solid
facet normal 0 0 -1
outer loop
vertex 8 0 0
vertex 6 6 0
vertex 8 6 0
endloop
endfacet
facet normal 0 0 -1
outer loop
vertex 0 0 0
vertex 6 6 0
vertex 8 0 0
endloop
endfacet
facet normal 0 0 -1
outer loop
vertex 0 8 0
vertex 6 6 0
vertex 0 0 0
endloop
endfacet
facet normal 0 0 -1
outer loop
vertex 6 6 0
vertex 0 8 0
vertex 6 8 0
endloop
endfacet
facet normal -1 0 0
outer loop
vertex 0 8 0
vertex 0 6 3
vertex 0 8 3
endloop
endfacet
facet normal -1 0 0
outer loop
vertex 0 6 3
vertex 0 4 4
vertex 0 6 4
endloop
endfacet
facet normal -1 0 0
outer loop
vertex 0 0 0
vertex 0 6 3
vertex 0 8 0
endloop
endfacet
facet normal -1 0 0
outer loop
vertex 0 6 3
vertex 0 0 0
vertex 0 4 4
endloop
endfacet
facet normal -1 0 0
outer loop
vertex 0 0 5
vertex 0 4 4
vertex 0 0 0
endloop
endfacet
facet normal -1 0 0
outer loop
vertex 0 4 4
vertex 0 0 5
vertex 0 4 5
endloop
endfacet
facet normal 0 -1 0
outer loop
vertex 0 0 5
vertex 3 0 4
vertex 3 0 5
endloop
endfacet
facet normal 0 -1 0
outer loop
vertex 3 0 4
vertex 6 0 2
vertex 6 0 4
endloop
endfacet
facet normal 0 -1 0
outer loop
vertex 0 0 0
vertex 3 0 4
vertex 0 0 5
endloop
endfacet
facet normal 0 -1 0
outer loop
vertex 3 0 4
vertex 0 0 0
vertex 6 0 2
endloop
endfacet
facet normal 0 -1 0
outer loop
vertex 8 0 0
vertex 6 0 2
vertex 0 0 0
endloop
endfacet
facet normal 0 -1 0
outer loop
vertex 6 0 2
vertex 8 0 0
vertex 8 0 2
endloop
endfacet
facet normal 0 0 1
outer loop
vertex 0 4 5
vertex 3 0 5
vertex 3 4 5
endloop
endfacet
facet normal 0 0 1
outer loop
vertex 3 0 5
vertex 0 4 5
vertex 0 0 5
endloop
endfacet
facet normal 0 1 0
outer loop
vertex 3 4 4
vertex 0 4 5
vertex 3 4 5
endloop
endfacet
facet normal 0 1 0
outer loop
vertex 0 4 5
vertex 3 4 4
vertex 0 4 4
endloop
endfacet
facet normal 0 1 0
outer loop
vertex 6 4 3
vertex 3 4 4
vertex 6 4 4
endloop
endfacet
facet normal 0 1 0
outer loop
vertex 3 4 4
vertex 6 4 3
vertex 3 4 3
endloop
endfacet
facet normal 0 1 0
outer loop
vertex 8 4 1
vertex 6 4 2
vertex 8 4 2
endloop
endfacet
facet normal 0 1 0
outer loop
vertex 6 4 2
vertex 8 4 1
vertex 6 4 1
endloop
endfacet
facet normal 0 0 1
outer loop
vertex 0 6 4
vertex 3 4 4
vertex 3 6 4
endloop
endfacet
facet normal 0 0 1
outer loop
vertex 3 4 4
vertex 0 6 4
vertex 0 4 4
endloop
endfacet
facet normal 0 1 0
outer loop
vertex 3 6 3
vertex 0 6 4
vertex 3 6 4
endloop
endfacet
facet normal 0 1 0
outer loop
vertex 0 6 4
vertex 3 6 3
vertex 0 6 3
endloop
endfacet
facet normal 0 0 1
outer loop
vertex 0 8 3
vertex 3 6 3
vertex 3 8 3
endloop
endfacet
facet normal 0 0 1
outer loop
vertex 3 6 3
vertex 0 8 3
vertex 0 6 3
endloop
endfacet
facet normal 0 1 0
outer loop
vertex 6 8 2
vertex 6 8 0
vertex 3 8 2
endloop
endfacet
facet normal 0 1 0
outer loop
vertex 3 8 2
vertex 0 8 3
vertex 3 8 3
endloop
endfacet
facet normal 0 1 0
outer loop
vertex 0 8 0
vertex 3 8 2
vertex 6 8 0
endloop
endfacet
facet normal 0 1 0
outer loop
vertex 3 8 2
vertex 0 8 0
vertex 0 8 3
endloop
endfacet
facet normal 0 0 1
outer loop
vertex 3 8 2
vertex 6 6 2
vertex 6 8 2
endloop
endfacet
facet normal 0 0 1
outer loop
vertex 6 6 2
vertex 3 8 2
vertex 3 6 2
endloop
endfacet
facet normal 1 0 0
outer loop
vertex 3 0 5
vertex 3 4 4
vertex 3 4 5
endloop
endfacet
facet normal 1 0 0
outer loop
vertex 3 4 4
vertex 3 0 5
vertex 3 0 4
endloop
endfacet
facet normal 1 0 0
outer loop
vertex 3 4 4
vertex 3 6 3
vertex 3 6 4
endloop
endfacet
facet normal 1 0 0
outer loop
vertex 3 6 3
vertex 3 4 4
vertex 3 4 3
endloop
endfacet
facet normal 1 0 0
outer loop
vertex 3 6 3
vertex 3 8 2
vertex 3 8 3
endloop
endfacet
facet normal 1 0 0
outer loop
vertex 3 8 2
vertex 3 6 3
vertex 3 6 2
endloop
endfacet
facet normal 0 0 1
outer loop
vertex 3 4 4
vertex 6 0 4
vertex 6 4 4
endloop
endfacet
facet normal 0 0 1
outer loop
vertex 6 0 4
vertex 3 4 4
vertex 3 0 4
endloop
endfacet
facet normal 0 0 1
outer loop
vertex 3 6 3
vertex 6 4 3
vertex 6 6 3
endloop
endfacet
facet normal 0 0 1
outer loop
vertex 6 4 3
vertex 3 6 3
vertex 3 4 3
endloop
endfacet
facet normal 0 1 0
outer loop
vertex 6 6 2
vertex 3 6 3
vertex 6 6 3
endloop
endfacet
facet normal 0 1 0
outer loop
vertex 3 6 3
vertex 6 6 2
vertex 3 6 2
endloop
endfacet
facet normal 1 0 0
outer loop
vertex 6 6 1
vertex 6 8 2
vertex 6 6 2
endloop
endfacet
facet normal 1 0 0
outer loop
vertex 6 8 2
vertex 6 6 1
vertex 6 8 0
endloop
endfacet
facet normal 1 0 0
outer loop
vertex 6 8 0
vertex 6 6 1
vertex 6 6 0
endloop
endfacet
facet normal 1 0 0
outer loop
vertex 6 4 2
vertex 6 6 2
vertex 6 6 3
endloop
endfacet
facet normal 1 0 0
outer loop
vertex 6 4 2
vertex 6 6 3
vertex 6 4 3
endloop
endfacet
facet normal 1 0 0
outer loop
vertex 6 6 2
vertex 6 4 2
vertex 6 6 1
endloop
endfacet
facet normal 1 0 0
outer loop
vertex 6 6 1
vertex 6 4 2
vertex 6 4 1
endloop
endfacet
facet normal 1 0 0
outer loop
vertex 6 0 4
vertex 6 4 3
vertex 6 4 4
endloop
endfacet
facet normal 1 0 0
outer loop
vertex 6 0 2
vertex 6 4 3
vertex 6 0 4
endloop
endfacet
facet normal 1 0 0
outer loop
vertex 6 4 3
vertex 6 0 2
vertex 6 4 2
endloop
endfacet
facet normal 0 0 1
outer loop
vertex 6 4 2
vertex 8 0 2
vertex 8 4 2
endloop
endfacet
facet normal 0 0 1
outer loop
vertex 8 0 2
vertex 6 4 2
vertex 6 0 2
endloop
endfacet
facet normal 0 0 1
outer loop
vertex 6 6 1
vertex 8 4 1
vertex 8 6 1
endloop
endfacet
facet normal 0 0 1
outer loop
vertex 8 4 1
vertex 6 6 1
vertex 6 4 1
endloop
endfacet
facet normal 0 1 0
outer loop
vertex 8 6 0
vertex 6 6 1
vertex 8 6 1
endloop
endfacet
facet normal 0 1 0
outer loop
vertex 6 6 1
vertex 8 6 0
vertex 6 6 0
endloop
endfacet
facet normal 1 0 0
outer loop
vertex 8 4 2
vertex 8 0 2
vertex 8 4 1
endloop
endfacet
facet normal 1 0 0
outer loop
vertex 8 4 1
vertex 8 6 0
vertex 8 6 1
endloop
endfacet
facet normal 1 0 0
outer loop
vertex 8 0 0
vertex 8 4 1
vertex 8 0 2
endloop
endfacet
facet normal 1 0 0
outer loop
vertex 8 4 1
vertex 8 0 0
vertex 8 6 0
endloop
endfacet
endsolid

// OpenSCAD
union() {
    translate([0, 0, 0]) cube([1, 1, 1]);
    translate([0, 0, 1]) cube([1, 1, 1]);
    translate([0, 0, 2]) cube([1, 1, 1]);
    translate([0, 0, 3]) cube([1, 1, 1]);
    translate([0, 0, 4]) cube([1, 1, 1]);
    translate([0, 1, 0]) cube([1, 1, 1]);
    translate([0, 1, 1]) cube([1, 1, 1]);
    translate([0, 1, 2]) cube([1, 1, 1]);
    translate([0, 1, 3]) cube([1, 1, 1]);
    translate([0, 1, 4]) cube([1, 1, 1]);
    translate([0, 2, 0]) cube([1, 1, 1]);
    translate([0, 2, 1]) cube([1, 1, 1]);
    translate([0, 2, 2]) cube([1, 1, 1]);
    translate([0, 2, 3]) cube([1, 1, 1]);
    translate([0, 2, 4]) cube([1, 1, 1]);
    translate([0, 3, 0]) cube([1, 1, 1]);
    translate([0, 3, 1]) cube([1, 1, 1]);
    translate([0, 3, 2]) cube([1, 1, 1]);
    translate([0, 3, 3]) cube([1, 1, 1]);
    translate([0, 3, 4]) cube([1, 1, 1]);
    translate([0, 4, 0]) cube([1, 1, 1]);
    translate([0, 4, 1]) cube([1, 1, 1]);
    translate([0, 4, 2]) cube([1, 1, 1]);
    translate([0, 4, 3]) cube([1, 1, 1]);
    translate([0, 5, 0]) cube([1, 1, 1]);
    translate([0, 5, 1]) cube([1, 1, 1]);
    translate([0, 5, 2]) cube([1, 1, 1]);
    translate([0, 5, 3]) cube([1, 1, 1]);
    translate([0, 6, 0]) cube([1, 1, 1]);
    translate([0, 6, 1]) cube([1, 1, 1]);
    translate([0, 6, 2]) cube([1, 1, 1]);
    translate([0, 7, 0]) cube([1, 1, 1]);
    translate([0, 7, 1]) cube([1, 1, 1]);
    translate([0, 7, 2]) cube([1, 1, 1]);
    translate([1, 0, 0]) cube([1, 1, 1]);
    translate([1, 0, 1]) cube([1, 1, 1]);
    translate([1, 0, 2]) cube([1, 1, 1]);
    translate([1, 0, 3]) cube([1, 1, 1]);
    translate([1, 0, 4]) cube([1, 1, 1]);
    translate([1, 1, 0]) cube([1, 1, 1]);
    translate([1, 1, 1]) cube([1, 1, 1]);
    translate([1, 1, 2]) cube([1, 1, 1]);
    translate([1, 1, 3]) cube([1, 1, 1]);
    translate([1, 1, 4]) cube([1, 1, 1]);
    translate([1, 2, 0]) cube([1, 1, 1]);
    translate([1, 2, 1]) cube([1, 1, 1]);
    translate([1, 2, 2]) cube([1, 1, 1]);
    translate([1, 2, 3]) cube([1, 1, 1]);
    translate([1, 2, 4]) cube([1, 1, 1]);
    translate([1, 3, 0]) cube([1, 1, 1]);
    translate([1, 3, 1]) cube([1, 1, 1]);
    translate([1, 3, 2]) cube([1, 1, 1]);
    translate([1, 3, 3]) cube([1, 1, 1]);
    translate([1, 3, 4]) cube([1, 1, 1]);
    translate([1, 4, 0]) cube([1, 1, 1]);
    translate([1, 4, 1]) cube([1, 1, 1]);
    translate([1, 4, 2]) cube([1, 1, 1]);
    translate([1, 4, 3]) cube([1, 1, 1]);
    translate([1, 5, 0]) cube([1, 1, 1]);
    translate([1, 5, 1]) cube([1, 1, 1]);
    translate([1, 5, 2]) cube([1, 1, 1]);
    translate([1, 5, 3]) cube([1, 1, 1]);
    translate([1, 6, 0]) cube([1, 1, 1]);
    translate([1, 6, 1]) cube([1, 1, 1]);
    translate([1, 6, 2]) cube([1, 1, 1]);
    translate([1, 7, 0]) cube([1, 1, 1]);
    translate([1, 7, 1]) cube([1, 1, 1]);
    translate([1, 7, 2]) cube([1, 1, 1]);
    translate([2, 0, 0]) cube([1, 1, 1]);
    translate([2, 0, 1]) cube([1, 1, 1]);
    translate([2, 0, 2]) cube([1, 1, 1]);
    translate([2, 0, 3]) cube([1, 1, 1]);
    translate([2, 0, 4]) cube([1, 1, 1]);
    translate([2, 1, 0]) cube([1, 1, 1]);
    translate([2, 1, 1]) cube([1, 1, 1]);
    translate([2, 1, 2]) cube([1, 1, 1]);
    translate([2, 1, 3]) cube([1, 1, 1]);
    translate([2, 1, 4]) cube([1, 1, 1]);
    translate([2, 2, 0]) cube([1, 1, 1]);
    translate([2, 2, 1]) cube([1, 1, 1]);
    translate([2, 2, 2]) cube([1, 1, 1]);
    translate([2, 2, 3]) cube([1, 1, 1]);
    translate([2, 2, 4]) cube([1, 1, 1]);
    translate([2, 3, 0]) cube([1, 1, 1]);
    translate([2, 3, 1]) cube([1, 1, 1]);
    translate([2, 3, 2]) cube([1, 1, 1]);
    translate([2, 3, 3]) cube([1, 1, 1]);
    translate([2, 3, 4]) cube([1, 1, 1]);
    translate([2, 4, 0]) cube([1, 1, 1]);
    translate([2, 4, 1]) cube([1, 1, 1]);
    translate([2, 4, 2]) cube([1, 1, 1]);
    translate([2, 4, 3]) cube([1, 1, 1]);
    translate([2, 5, 0]) cube([1, 1, 1]);
    translate([2, 5, 1]) cube([1, 1, 1]);
    translate([2, 5, 2]) cube([1, 1, 1]);
    translate([2, 5, 3]) cube([1, 1, 1]);
    translate([2, 6, 0]) cube([1, 1, 1]);
    translate([2, 6, 1]) cube([1, 1, 1]);
    translate([2, 6, 2]) cube([1, 1, 1]);
    translate([2, 7, 0]) cube([1, 1, 1]);
    translate([2, 7, 1]) cube([1, 1, 1]);
    translate([2, 7, 2]) cube([1, 1, 1]);
    translate([3, 0, 0]) cube([1, 1, 1]);
    translate([3, 0, 1]) cube([1, 1, 1]);
    translate([3, 0, 2]) cube([1, 1, 1]);
    translate([3, 0, 3]) cube([1, 1, 1]);
    translate([3, 1, 0]) cube([1, 1, 1]);
    translate([3, 1, 1]) cube([1, 1, 1]);
    translate([3, 1, 2]) cube([1, 1, 1]);
    translate([3, 1, 3]) cube([1, 1, 1]);
    translate([3, 2, 0]) cube([1, 1, 1]);
    translate([3, 2, 1]) cube([1, 1, 1]);
    translate([3, 2, 2]) cube([1, 1, 1]);
    translate([3, 2, 3]) cube([1, 1, 1]);
    translate([3, 3, 0]) cube([1, 1, 1]);
    translate([3, 3, 1]) cube([1, 1, 1]);
    translate([3, 3, 2]) cube([1, 1, 1]);
    translate([3, 3, 3]) cube([1, 1, 1]);
    translate([3, 4, 0]) cube([1, 1, 1]);
    translate([3, 4, 1]) cube([1, 1, 1]);
    translate([3, 4, 2]) cube([1, 1, 1]);
    translate([3, 5, 0]) cube([1, 1, 1]);
    translate([3, 5, 1]) cube([1, 1, 1]);
    translate([3, 5, 2]) cube([1, 1, 1]);
    translate([3, 6, 0]) cube([1, 1, 1]);
    translate([3, 6, 1]) cube([1, 1, 1]);
    translate([3, 7, 0]) cube([1, 1, 1]);
    translate([3, 7, 1]) cube([1, 1, 1]);
    translate([4, 0, 0]) cube([1, 1, 1]);
    translate([4, 0, 1]) cube([1, 1, 1]);
    translate([4, 0, 2]) cube([1, 1, 1]);
    translate([4, 0, 3]) cube([1, 1, 1]);
    translate([4, 1, 0]) cube([1, 1, 1]);
    translate([4, 1, 1]) cube([1, 1, 1]);
    translate([4, 1, 2]) cube([1, 1, 1]);
    translate([4, 1, 3]) cube([1, 1, 1]);
    translate([4, 2, 0]) cube([1, 1, 1]);
    translate([4, 2, 1]) cube([1, 1, 1]);
    translate([4, 2, 2]) cube([1, 1, 1]);
    translate([4, 2, 3]) cube([1, 1, 1]);
    translate([4, 3, 0]) cube([1, 1, 1]);
    translate([4, 3, 1]) cube([1, 1, 1]);
    translate([4, 3, 2]) cube([1, 1, 1]);
    translate([4, 3, 3]) cube([1, 1, 1]);
    translate([4, 4, 0]) cube([1, 1, 1]);
    translate([4, 4, 1]) cube([1, 1, 1]);
    translate([4, 4, 2]) cube([1, 1, 1]);
    translate([4, 5, 0]) cube([1, 1, 1]);
    translate([4, 5, 1]) cube([1, 1, 1]);
    translate([4, 5, 2]) cube([1, 1, 1]);
    translate([4, 6, 0]) cube([1, 1, 1]);
    translate([4, 6, 1]) cube([1, 1, 1]);
    translate([4, 7, 0]) cube([1, 1, 1]);
    translate([4, 7, 1]) cube([1, 1, 1]);
    translate([5, 0, 0]) cube([1, 1, 1]);
    translate([5, 0, 1]) cube([1, 1, 1]);
    translate([5, 0, 2]) cube([1, 1, 1]);
    translate([5, 0, 3]) cube([1, 1, 1]);
    translate([5, 1, 0]) cube([1, 1, 1]);
    translate([5, 1, 1]) cube([1, 1, 1]);
    translate([5, 1, 2]) cube([1, 1, 1]);
    translate([5, 1, 3]) cube([1, 1, 1]);
    translate([5, 2, 0]) cube([1, 1, 1]);
    translate([5, 2, 1]) cube([1, 1, 1]);
    translate([5, 2, 2]) cube([1, 1, 1]);
    translate([5, 2, 3]) cube([1, 1, 1]);
    translate([5, 3, 0]) cube([1, 1, 1]);
    translate([5, 3, 1]) cube([1, 1, 1]);
    translate([5, 3, 2]) cube([1, 1, 1]);
    translate([5, 3, 3]) cube([1, 1, 1]);
    translate([5, 4, 0]) cube([1, 1, 1]);
    translate([5, 4, 1]) cube([1, 1, 1]);
    translate([5, 4, 2]) cube([1, 1, 1]);
    translate([5, 5, 0]) cube([1, 1, 1]);
    translate([5, 5, 1]) cube([1, 1, 1]);
    translate([5, 5, 2]) cube([1, 1, 1]);
    translate([5, 6, 0]) cube([1, 1, 1]);
    translate([5, 6, 1]) cube([1, 1, 1]);
    translate([5, 7, 0]) cube([1, 1, 1]);
    translate([5, 7, 1]) cube([1, 1, 1]);
    translate([6, 0, 0]) cube([1, 1, 1]);
    translate([6, 0, 1]) cube([1, 1, 1]);
    translate([6, 1, 0]) cube([1, 1, 1]);
    translate([6, 1, 1]) cube([1, 1, 1]);
    translate([6, 2, 0]) cube([1, 1, 1]);
    translate([6, 2, 1]) cube([1, 1, 1]);
    translate([6, 3, 0]) cube([1, 1, 1]);
    translate([6, 3, 1]) cube([1, 1, 1]);
    translate([6, 4, 0]) cube([1, 1, 1]);
    translate([6, 5, 0]) cube([1, 1, 1]);
    translate([7, 0, 0]) cube([1, 1, 1]);
    translate([7, 0, 1]) cube([1, 1, 1]);
    translate([7, 1, 0]) cube([1, 1, 1]);
    translate([7, 1, 1]) cube([1, 1, 1]);
    translate([7, 2, 0]) cube([1, 1, 1]);
    translate([7, 2, 1]) cube([1, 1, 1]);
    translate([7, 3, 0]) cube([1, 1, 1]);
    translate([7, 3, 1]) cube([1, 1, 1]);
    translate([7, 4, 0]) cube([1, 1, 1]);
    translate([7, 5, 0]) cube([1, 1, 1]);
}
